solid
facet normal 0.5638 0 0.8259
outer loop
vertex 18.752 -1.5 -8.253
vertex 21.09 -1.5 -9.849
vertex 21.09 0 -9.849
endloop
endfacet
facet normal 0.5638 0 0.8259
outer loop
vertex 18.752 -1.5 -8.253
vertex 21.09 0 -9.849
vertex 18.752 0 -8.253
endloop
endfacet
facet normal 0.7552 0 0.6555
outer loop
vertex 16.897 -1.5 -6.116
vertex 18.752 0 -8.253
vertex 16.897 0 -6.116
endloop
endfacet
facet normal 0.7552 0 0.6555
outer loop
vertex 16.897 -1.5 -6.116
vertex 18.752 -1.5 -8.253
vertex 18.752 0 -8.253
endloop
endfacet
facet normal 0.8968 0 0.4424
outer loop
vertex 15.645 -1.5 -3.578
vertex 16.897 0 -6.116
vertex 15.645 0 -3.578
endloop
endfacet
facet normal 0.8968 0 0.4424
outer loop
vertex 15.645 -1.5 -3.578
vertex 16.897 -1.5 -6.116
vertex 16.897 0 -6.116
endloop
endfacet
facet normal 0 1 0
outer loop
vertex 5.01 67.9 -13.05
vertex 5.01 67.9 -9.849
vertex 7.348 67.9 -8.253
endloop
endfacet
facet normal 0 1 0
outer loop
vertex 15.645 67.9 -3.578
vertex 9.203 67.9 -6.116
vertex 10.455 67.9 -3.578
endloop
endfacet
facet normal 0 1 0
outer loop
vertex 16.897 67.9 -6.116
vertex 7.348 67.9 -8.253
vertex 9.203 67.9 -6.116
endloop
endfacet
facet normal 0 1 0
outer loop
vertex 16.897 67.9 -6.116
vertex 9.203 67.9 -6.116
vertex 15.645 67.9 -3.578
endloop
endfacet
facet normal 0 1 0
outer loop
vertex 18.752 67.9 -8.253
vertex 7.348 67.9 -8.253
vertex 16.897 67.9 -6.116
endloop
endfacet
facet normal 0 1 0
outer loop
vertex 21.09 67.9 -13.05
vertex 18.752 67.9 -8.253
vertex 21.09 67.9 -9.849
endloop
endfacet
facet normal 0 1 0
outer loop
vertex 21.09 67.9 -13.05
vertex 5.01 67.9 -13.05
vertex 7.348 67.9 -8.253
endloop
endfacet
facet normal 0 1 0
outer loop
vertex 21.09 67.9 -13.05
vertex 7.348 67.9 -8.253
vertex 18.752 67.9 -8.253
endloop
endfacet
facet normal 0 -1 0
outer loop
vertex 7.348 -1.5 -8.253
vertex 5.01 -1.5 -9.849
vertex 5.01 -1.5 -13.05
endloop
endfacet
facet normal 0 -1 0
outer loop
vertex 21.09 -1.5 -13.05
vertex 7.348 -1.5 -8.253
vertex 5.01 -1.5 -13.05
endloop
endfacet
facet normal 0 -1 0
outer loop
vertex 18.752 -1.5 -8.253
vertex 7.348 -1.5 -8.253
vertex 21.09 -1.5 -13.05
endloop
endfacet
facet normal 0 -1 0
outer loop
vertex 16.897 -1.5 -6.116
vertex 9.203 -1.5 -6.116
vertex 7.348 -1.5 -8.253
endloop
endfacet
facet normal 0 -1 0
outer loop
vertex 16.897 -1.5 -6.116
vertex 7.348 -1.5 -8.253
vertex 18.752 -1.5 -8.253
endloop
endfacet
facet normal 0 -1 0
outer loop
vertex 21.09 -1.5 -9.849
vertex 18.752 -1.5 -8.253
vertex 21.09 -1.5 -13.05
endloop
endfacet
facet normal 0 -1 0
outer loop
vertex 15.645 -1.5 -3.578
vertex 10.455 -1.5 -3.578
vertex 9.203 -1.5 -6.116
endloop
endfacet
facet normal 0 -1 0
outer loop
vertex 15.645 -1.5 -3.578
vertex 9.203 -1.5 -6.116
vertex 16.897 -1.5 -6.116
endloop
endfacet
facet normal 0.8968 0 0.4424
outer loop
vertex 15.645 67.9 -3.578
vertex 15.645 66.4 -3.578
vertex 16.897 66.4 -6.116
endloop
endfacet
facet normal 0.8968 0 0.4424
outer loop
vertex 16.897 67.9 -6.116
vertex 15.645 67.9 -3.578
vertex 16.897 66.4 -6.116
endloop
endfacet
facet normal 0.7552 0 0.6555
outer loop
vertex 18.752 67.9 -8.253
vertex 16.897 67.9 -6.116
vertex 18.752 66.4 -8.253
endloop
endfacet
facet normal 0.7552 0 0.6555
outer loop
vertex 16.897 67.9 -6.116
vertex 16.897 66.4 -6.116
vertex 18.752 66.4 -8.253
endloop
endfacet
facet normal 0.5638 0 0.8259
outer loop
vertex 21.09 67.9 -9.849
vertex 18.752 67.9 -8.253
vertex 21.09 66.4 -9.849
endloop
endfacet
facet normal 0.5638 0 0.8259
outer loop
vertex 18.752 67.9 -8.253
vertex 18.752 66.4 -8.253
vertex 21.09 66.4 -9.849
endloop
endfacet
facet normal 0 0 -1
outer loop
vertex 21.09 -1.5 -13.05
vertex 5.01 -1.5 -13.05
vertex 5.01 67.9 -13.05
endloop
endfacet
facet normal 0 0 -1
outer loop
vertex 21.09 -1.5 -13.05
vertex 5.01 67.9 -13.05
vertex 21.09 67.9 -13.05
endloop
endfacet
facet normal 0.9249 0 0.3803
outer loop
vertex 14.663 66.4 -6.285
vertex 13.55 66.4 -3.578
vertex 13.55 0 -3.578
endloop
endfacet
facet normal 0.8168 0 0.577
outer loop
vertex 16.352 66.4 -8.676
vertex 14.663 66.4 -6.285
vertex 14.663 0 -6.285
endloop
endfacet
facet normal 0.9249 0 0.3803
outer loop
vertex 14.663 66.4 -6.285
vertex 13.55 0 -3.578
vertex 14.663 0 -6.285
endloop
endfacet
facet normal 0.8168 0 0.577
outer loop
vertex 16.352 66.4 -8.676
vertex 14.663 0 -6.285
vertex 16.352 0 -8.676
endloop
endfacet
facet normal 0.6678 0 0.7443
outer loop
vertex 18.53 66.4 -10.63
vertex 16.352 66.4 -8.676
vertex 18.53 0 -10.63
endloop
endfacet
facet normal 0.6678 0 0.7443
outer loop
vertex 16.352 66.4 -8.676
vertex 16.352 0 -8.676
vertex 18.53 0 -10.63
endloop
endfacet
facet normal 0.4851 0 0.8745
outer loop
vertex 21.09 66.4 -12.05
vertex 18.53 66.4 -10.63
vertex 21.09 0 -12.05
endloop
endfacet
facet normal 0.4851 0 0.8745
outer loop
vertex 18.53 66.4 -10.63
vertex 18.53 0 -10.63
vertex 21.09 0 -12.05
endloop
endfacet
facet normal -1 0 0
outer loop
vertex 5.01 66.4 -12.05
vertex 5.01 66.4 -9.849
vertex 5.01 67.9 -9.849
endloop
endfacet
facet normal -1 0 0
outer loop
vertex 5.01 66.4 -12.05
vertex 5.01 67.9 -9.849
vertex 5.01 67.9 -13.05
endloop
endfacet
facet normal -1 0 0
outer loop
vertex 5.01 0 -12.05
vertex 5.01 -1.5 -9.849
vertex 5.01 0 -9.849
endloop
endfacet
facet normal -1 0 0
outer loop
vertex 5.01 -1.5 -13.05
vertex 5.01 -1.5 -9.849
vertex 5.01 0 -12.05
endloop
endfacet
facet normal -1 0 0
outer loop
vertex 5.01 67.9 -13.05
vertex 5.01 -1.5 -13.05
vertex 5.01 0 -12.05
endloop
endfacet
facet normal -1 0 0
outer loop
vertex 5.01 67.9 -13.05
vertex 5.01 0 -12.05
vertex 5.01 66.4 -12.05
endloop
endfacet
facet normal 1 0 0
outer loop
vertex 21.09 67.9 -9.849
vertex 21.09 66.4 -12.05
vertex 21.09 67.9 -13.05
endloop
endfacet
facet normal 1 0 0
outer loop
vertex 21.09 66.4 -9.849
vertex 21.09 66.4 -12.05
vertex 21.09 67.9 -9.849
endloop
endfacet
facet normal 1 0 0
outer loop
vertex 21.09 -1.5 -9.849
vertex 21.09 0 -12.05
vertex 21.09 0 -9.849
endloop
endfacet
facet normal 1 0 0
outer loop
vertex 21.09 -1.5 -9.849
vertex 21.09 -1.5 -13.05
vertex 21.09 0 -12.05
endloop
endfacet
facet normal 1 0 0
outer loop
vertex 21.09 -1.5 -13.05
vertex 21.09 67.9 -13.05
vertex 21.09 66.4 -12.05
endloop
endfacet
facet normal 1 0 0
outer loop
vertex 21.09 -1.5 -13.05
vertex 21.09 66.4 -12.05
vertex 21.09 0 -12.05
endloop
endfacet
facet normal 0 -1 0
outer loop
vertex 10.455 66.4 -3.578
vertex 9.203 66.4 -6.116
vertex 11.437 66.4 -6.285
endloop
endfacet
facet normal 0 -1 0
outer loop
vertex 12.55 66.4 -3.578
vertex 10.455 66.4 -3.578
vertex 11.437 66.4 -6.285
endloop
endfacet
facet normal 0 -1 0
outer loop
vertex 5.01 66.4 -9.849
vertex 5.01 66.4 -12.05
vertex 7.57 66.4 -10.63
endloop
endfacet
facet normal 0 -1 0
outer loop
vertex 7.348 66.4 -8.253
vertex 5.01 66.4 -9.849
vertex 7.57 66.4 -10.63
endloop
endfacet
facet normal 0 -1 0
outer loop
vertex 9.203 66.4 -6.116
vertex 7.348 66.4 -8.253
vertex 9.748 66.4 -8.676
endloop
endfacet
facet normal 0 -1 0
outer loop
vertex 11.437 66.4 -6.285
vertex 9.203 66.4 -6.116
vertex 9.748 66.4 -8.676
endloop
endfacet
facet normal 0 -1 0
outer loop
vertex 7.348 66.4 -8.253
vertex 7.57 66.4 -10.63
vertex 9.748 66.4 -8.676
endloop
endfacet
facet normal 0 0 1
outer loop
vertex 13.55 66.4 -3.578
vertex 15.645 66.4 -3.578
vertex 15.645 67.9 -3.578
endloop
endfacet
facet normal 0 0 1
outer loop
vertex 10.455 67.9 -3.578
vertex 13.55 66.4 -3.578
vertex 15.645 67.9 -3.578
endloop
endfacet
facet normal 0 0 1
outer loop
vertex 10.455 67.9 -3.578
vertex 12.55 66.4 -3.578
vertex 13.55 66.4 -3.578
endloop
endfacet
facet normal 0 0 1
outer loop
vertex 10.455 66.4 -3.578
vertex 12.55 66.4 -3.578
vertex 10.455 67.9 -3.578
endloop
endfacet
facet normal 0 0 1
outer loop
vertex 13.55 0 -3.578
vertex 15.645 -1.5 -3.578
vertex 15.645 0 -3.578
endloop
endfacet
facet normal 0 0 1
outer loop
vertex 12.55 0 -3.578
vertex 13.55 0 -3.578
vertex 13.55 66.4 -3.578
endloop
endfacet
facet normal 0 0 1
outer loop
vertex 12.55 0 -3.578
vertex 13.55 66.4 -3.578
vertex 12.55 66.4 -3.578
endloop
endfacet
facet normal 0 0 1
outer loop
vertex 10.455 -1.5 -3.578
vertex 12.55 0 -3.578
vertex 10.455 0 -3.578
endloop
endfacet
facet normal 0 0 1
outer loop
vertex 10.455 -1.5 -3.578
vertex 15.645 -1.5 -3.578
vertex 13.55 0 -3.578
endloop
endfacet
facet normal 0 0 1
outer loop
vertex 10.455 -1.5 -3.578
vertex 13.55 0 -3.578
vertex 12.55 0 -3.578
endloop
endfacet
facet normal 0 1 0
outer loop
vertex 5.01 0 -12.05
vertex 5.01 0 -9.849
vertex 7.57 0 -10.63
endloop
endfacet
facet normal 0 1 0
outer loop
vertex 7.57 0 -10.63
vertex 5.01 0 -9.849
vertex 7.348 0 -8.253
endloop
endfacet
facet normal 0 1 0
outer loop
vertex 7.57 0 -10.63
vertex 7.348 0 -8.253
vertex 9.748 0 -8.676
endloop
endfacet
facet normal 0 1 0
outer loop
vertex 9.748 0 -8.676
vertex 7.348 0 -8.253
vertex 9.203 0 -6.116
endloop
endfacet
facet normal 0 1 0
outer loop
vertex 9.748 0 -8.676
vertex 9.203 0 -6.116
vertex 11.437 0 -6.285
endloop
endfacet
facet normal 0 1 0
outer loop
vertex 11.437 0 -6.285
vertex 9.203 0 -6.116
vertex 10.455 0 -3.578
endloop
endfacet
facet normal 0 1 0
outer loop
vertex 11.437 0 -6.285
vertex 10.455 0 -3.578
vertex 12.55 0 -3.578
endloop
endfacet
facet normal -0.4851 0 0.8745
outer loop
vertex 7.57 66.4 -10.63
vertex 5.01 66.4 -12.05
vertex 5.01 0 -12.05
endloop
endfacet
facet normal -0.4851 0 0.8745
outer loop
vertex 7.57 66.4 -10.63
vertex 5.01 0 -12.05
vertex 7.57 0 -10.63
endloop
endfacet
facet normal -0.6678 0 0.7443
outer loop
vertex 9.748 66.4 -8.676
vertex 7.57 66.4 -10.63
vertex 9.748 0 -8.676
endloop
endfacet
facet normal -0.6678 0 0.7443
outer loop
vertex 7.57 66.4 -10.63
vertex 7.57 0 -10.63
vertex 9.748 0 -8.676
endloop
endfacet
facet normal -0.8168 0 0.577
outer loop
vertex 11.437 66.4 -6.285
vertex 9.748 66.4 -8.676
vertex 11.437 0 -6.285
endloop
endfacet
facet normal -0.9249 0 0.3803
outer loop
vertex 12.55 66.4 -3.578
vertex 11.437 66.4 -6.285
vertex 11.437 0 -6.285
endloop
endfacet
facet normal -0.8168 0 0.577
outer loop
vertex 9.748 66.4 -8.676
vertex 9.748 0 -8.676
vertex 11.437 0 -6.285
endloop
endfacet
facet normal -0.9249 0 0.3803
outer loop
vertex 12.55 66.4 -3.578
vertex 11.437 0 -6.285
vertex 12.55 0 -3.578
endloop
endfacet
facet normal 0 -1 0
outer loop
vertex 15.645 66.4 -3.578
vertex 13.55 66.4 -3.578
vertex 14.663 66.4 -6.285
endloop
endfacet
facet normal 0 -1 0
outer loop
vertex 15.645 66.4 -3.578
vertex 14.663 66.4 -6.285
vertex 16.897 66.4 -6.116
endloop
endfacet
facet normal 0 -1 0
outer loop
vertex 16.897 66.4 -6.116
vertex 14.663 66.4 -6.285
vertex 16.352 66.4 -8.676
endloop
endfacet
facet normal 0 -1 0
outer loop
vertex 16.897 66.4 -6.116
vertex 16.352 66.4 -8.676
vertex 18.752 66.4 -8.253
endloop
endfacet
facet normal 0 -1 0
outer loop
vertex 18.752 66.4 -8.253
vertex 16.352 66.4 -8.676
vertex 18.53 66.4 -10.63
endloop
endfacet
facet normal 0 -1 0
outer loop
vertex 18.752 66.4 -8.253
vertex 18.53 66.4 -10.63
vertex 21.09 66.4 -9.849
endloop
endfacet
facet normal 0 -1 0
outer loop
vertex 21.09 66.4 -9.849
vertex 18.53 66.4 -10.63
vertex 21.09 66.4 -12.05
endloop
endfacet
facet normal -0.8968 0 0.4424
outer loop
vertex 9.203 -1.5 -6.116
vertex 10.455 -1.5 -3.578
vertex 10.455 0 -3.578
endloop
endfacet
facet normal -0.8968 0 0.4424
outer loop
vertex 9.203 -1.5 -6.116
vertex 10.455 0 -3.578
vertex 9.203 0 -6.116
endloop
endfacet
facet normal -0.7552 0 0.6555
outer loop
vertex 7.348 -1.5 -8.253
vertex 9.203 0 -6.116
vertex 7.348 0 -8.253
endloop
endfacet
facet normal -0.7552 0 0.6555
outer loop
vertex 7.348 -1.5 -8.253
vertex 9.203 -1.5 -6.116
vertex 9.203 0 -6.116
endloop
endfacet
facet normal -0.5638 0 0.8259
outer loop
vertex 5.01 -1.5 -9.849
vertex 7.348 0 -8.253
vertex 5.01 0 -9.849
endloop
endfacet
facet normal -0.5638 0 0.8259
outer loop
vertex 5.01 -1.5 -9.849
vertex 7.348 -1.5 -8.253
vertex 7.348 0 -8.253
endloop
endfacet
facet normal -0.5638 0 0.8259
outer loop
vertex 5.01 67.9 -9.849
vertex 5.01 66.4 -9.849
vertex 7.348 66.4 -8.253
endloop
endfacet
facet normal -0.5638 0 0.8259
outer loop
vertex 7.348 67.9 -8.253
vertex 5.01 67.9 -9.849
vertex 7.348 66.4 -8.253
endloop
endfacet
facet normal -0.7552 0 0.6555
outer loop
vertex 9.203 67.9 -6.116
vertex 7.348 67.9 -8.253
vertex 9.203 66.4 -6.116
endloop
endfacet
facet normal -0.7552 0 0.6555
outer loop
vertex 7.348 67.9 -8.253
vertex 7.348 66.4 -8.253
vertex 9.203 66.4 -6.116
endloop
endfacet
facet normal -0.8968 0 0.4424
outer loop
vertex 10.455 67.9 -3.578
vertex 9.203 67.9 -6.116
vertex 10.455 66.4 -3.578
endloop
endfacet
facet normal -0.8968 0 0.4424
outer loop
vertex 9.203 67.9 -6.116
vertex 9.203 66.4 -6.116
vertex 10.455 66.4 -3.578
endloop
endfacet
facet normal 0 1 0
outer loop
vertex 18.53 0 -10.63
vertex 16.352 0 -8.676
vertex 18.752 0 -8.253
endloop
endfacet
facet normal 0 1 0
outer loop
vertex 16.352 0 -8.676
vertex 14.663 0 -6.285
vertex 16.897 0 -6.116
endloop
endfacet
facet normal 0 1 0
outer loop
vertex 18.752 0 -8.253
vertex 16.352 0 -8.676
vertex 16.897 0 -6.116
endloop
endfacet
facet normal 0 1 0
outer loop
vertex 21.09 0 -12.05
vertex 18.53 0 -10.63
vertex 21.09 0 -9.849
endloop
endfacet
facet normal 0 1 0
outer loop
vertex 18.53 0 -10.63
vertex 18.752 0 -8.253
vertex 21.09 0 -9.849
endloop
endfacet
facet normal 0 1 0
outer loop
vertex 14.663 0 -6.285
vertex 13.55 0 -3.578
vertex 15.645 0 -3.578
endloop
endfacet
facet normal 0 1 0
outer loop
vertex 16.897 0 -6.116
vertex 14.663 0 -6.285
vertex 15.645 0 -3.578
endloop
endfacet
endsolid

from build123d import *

# Parameters (mm, degrees)
EXTRUDE_1_DEPTH = 66.4
EXTRUDE_2_DEPTH = 1.5
EXTRUDE_START   = 1.5
EXTRUDE_3_DEPTH = 1.5


with BuildPart() as part:
    # 草图1 → 凸台-拉伸1 (new body)
    with BuildSketch(Plane(origin=(0, 0, 0), x_dir=(1, 0, 0), z_dir=(0, 1, 0))):
        with BuildLine():
            Line((12.55, 3.577708764), (13.55, 3.577708764))
            ThreePointArc((13.55, 3.577708764), (16.351500522, 8.675785724), (21.09000998, 12.05))
            Line((21.09000998, 12.05), (21.09000998, 13.05))
            Line((21.09000998, 13.05), (5.00999002, 13.05))
            Line((5.00999002, 13.05), (5.00999002, 12.05))
            ThreePointArc((5.00999002, 12.05), (9.748499478, 8.675785724), (12.55, 3.577708764))
        make_face()
    extrude(amount=EXTRUDE_1_DEPTH)

    # 草图2 → 凸台-拉伸2 (add)
    with BuildSketch(Plane(origin=(0, 66.4, 0), x_dir=(1, 0, 0), z_dir=(0, 1, 0))):
        with BuildLine():
            Line((5.00999002, 13.05), (5.00999002, 9.848984719))
            ThreePointArc((5.00999002, 9.848984719), (8.343981739, 7.244340463), (10.454783594, 3.577708764))
            Line((10.454783594, 3.577708764), (15.645216406, 3.577708764))
            ThreePointArc((15.645216406, 3.577708764), (17.756018261, 7.244340463), (21.09000998, 9.848984719))
            Line((21.09000998, 9.848984719), (21.09000998, 13.05))
            Line((21.09000998, 13.05), (5.00999002, 13.05))
        make_face()
    extrude(amount=EXTRUDE_2_DEPTH)

    # 草图3 → 凸台-拉伸3 (add)
    with BuildSketch(Plane.XZ.offset(EXTRUDE_START)):
        with BuildLine():
            Line((12.55, -3.577708764), (10.454783594, -3.577708764))
            ThreePointArc((10.454783594, -3.577708764), (8.343981739, -7.244340463), (5.00999002, -9.848984719))
            Line((5.00999002, -9.848984719), (5.00999002, -12.05))
            ThreePointArc((5.00999002, -12.05), (9.748499478, -8.675785724), (12.55, -3.577708764))
        make_face()
        with BuildLine():
            Line((13.55, -3.577708764), (12.55, -3.577708764))
            ThreePointArc((12.55, -3.577708764), (9.748499478, -8.675785724), (5.00999002, -12.05))
            Line((5.00999002, -12.05), (5.00999002, -13.05))
            Line((5.00999002, -13.05), (21.09000998, -13.05))
            Line((21.09000998, -13.05), (21.09000998, -12.05))
            ThreePointArc((21.09000998, -12.05), (16.351500522, -8.675785724), (13.55, -3.577708764))
        make_face()
        with BuildLine():
            Line((15.645216406, -3.577708764), (13.55, -3.577708764))
            ThreePointArc((13.55, -3.577708764), (16.351500522, -8.675785724), (21.09000998, -12.05))
            Line((21.09000998, -12.05), (21.09000998, -9.848984719))
            ThreePointArc((21.09000998, -9.848984719), (17.756018261, -7.244340463), (15.645216406, -3.577708764))
        make_face()
    extrude(amount=-EXTRUDE_3_DEPTH)


solid = part.part
